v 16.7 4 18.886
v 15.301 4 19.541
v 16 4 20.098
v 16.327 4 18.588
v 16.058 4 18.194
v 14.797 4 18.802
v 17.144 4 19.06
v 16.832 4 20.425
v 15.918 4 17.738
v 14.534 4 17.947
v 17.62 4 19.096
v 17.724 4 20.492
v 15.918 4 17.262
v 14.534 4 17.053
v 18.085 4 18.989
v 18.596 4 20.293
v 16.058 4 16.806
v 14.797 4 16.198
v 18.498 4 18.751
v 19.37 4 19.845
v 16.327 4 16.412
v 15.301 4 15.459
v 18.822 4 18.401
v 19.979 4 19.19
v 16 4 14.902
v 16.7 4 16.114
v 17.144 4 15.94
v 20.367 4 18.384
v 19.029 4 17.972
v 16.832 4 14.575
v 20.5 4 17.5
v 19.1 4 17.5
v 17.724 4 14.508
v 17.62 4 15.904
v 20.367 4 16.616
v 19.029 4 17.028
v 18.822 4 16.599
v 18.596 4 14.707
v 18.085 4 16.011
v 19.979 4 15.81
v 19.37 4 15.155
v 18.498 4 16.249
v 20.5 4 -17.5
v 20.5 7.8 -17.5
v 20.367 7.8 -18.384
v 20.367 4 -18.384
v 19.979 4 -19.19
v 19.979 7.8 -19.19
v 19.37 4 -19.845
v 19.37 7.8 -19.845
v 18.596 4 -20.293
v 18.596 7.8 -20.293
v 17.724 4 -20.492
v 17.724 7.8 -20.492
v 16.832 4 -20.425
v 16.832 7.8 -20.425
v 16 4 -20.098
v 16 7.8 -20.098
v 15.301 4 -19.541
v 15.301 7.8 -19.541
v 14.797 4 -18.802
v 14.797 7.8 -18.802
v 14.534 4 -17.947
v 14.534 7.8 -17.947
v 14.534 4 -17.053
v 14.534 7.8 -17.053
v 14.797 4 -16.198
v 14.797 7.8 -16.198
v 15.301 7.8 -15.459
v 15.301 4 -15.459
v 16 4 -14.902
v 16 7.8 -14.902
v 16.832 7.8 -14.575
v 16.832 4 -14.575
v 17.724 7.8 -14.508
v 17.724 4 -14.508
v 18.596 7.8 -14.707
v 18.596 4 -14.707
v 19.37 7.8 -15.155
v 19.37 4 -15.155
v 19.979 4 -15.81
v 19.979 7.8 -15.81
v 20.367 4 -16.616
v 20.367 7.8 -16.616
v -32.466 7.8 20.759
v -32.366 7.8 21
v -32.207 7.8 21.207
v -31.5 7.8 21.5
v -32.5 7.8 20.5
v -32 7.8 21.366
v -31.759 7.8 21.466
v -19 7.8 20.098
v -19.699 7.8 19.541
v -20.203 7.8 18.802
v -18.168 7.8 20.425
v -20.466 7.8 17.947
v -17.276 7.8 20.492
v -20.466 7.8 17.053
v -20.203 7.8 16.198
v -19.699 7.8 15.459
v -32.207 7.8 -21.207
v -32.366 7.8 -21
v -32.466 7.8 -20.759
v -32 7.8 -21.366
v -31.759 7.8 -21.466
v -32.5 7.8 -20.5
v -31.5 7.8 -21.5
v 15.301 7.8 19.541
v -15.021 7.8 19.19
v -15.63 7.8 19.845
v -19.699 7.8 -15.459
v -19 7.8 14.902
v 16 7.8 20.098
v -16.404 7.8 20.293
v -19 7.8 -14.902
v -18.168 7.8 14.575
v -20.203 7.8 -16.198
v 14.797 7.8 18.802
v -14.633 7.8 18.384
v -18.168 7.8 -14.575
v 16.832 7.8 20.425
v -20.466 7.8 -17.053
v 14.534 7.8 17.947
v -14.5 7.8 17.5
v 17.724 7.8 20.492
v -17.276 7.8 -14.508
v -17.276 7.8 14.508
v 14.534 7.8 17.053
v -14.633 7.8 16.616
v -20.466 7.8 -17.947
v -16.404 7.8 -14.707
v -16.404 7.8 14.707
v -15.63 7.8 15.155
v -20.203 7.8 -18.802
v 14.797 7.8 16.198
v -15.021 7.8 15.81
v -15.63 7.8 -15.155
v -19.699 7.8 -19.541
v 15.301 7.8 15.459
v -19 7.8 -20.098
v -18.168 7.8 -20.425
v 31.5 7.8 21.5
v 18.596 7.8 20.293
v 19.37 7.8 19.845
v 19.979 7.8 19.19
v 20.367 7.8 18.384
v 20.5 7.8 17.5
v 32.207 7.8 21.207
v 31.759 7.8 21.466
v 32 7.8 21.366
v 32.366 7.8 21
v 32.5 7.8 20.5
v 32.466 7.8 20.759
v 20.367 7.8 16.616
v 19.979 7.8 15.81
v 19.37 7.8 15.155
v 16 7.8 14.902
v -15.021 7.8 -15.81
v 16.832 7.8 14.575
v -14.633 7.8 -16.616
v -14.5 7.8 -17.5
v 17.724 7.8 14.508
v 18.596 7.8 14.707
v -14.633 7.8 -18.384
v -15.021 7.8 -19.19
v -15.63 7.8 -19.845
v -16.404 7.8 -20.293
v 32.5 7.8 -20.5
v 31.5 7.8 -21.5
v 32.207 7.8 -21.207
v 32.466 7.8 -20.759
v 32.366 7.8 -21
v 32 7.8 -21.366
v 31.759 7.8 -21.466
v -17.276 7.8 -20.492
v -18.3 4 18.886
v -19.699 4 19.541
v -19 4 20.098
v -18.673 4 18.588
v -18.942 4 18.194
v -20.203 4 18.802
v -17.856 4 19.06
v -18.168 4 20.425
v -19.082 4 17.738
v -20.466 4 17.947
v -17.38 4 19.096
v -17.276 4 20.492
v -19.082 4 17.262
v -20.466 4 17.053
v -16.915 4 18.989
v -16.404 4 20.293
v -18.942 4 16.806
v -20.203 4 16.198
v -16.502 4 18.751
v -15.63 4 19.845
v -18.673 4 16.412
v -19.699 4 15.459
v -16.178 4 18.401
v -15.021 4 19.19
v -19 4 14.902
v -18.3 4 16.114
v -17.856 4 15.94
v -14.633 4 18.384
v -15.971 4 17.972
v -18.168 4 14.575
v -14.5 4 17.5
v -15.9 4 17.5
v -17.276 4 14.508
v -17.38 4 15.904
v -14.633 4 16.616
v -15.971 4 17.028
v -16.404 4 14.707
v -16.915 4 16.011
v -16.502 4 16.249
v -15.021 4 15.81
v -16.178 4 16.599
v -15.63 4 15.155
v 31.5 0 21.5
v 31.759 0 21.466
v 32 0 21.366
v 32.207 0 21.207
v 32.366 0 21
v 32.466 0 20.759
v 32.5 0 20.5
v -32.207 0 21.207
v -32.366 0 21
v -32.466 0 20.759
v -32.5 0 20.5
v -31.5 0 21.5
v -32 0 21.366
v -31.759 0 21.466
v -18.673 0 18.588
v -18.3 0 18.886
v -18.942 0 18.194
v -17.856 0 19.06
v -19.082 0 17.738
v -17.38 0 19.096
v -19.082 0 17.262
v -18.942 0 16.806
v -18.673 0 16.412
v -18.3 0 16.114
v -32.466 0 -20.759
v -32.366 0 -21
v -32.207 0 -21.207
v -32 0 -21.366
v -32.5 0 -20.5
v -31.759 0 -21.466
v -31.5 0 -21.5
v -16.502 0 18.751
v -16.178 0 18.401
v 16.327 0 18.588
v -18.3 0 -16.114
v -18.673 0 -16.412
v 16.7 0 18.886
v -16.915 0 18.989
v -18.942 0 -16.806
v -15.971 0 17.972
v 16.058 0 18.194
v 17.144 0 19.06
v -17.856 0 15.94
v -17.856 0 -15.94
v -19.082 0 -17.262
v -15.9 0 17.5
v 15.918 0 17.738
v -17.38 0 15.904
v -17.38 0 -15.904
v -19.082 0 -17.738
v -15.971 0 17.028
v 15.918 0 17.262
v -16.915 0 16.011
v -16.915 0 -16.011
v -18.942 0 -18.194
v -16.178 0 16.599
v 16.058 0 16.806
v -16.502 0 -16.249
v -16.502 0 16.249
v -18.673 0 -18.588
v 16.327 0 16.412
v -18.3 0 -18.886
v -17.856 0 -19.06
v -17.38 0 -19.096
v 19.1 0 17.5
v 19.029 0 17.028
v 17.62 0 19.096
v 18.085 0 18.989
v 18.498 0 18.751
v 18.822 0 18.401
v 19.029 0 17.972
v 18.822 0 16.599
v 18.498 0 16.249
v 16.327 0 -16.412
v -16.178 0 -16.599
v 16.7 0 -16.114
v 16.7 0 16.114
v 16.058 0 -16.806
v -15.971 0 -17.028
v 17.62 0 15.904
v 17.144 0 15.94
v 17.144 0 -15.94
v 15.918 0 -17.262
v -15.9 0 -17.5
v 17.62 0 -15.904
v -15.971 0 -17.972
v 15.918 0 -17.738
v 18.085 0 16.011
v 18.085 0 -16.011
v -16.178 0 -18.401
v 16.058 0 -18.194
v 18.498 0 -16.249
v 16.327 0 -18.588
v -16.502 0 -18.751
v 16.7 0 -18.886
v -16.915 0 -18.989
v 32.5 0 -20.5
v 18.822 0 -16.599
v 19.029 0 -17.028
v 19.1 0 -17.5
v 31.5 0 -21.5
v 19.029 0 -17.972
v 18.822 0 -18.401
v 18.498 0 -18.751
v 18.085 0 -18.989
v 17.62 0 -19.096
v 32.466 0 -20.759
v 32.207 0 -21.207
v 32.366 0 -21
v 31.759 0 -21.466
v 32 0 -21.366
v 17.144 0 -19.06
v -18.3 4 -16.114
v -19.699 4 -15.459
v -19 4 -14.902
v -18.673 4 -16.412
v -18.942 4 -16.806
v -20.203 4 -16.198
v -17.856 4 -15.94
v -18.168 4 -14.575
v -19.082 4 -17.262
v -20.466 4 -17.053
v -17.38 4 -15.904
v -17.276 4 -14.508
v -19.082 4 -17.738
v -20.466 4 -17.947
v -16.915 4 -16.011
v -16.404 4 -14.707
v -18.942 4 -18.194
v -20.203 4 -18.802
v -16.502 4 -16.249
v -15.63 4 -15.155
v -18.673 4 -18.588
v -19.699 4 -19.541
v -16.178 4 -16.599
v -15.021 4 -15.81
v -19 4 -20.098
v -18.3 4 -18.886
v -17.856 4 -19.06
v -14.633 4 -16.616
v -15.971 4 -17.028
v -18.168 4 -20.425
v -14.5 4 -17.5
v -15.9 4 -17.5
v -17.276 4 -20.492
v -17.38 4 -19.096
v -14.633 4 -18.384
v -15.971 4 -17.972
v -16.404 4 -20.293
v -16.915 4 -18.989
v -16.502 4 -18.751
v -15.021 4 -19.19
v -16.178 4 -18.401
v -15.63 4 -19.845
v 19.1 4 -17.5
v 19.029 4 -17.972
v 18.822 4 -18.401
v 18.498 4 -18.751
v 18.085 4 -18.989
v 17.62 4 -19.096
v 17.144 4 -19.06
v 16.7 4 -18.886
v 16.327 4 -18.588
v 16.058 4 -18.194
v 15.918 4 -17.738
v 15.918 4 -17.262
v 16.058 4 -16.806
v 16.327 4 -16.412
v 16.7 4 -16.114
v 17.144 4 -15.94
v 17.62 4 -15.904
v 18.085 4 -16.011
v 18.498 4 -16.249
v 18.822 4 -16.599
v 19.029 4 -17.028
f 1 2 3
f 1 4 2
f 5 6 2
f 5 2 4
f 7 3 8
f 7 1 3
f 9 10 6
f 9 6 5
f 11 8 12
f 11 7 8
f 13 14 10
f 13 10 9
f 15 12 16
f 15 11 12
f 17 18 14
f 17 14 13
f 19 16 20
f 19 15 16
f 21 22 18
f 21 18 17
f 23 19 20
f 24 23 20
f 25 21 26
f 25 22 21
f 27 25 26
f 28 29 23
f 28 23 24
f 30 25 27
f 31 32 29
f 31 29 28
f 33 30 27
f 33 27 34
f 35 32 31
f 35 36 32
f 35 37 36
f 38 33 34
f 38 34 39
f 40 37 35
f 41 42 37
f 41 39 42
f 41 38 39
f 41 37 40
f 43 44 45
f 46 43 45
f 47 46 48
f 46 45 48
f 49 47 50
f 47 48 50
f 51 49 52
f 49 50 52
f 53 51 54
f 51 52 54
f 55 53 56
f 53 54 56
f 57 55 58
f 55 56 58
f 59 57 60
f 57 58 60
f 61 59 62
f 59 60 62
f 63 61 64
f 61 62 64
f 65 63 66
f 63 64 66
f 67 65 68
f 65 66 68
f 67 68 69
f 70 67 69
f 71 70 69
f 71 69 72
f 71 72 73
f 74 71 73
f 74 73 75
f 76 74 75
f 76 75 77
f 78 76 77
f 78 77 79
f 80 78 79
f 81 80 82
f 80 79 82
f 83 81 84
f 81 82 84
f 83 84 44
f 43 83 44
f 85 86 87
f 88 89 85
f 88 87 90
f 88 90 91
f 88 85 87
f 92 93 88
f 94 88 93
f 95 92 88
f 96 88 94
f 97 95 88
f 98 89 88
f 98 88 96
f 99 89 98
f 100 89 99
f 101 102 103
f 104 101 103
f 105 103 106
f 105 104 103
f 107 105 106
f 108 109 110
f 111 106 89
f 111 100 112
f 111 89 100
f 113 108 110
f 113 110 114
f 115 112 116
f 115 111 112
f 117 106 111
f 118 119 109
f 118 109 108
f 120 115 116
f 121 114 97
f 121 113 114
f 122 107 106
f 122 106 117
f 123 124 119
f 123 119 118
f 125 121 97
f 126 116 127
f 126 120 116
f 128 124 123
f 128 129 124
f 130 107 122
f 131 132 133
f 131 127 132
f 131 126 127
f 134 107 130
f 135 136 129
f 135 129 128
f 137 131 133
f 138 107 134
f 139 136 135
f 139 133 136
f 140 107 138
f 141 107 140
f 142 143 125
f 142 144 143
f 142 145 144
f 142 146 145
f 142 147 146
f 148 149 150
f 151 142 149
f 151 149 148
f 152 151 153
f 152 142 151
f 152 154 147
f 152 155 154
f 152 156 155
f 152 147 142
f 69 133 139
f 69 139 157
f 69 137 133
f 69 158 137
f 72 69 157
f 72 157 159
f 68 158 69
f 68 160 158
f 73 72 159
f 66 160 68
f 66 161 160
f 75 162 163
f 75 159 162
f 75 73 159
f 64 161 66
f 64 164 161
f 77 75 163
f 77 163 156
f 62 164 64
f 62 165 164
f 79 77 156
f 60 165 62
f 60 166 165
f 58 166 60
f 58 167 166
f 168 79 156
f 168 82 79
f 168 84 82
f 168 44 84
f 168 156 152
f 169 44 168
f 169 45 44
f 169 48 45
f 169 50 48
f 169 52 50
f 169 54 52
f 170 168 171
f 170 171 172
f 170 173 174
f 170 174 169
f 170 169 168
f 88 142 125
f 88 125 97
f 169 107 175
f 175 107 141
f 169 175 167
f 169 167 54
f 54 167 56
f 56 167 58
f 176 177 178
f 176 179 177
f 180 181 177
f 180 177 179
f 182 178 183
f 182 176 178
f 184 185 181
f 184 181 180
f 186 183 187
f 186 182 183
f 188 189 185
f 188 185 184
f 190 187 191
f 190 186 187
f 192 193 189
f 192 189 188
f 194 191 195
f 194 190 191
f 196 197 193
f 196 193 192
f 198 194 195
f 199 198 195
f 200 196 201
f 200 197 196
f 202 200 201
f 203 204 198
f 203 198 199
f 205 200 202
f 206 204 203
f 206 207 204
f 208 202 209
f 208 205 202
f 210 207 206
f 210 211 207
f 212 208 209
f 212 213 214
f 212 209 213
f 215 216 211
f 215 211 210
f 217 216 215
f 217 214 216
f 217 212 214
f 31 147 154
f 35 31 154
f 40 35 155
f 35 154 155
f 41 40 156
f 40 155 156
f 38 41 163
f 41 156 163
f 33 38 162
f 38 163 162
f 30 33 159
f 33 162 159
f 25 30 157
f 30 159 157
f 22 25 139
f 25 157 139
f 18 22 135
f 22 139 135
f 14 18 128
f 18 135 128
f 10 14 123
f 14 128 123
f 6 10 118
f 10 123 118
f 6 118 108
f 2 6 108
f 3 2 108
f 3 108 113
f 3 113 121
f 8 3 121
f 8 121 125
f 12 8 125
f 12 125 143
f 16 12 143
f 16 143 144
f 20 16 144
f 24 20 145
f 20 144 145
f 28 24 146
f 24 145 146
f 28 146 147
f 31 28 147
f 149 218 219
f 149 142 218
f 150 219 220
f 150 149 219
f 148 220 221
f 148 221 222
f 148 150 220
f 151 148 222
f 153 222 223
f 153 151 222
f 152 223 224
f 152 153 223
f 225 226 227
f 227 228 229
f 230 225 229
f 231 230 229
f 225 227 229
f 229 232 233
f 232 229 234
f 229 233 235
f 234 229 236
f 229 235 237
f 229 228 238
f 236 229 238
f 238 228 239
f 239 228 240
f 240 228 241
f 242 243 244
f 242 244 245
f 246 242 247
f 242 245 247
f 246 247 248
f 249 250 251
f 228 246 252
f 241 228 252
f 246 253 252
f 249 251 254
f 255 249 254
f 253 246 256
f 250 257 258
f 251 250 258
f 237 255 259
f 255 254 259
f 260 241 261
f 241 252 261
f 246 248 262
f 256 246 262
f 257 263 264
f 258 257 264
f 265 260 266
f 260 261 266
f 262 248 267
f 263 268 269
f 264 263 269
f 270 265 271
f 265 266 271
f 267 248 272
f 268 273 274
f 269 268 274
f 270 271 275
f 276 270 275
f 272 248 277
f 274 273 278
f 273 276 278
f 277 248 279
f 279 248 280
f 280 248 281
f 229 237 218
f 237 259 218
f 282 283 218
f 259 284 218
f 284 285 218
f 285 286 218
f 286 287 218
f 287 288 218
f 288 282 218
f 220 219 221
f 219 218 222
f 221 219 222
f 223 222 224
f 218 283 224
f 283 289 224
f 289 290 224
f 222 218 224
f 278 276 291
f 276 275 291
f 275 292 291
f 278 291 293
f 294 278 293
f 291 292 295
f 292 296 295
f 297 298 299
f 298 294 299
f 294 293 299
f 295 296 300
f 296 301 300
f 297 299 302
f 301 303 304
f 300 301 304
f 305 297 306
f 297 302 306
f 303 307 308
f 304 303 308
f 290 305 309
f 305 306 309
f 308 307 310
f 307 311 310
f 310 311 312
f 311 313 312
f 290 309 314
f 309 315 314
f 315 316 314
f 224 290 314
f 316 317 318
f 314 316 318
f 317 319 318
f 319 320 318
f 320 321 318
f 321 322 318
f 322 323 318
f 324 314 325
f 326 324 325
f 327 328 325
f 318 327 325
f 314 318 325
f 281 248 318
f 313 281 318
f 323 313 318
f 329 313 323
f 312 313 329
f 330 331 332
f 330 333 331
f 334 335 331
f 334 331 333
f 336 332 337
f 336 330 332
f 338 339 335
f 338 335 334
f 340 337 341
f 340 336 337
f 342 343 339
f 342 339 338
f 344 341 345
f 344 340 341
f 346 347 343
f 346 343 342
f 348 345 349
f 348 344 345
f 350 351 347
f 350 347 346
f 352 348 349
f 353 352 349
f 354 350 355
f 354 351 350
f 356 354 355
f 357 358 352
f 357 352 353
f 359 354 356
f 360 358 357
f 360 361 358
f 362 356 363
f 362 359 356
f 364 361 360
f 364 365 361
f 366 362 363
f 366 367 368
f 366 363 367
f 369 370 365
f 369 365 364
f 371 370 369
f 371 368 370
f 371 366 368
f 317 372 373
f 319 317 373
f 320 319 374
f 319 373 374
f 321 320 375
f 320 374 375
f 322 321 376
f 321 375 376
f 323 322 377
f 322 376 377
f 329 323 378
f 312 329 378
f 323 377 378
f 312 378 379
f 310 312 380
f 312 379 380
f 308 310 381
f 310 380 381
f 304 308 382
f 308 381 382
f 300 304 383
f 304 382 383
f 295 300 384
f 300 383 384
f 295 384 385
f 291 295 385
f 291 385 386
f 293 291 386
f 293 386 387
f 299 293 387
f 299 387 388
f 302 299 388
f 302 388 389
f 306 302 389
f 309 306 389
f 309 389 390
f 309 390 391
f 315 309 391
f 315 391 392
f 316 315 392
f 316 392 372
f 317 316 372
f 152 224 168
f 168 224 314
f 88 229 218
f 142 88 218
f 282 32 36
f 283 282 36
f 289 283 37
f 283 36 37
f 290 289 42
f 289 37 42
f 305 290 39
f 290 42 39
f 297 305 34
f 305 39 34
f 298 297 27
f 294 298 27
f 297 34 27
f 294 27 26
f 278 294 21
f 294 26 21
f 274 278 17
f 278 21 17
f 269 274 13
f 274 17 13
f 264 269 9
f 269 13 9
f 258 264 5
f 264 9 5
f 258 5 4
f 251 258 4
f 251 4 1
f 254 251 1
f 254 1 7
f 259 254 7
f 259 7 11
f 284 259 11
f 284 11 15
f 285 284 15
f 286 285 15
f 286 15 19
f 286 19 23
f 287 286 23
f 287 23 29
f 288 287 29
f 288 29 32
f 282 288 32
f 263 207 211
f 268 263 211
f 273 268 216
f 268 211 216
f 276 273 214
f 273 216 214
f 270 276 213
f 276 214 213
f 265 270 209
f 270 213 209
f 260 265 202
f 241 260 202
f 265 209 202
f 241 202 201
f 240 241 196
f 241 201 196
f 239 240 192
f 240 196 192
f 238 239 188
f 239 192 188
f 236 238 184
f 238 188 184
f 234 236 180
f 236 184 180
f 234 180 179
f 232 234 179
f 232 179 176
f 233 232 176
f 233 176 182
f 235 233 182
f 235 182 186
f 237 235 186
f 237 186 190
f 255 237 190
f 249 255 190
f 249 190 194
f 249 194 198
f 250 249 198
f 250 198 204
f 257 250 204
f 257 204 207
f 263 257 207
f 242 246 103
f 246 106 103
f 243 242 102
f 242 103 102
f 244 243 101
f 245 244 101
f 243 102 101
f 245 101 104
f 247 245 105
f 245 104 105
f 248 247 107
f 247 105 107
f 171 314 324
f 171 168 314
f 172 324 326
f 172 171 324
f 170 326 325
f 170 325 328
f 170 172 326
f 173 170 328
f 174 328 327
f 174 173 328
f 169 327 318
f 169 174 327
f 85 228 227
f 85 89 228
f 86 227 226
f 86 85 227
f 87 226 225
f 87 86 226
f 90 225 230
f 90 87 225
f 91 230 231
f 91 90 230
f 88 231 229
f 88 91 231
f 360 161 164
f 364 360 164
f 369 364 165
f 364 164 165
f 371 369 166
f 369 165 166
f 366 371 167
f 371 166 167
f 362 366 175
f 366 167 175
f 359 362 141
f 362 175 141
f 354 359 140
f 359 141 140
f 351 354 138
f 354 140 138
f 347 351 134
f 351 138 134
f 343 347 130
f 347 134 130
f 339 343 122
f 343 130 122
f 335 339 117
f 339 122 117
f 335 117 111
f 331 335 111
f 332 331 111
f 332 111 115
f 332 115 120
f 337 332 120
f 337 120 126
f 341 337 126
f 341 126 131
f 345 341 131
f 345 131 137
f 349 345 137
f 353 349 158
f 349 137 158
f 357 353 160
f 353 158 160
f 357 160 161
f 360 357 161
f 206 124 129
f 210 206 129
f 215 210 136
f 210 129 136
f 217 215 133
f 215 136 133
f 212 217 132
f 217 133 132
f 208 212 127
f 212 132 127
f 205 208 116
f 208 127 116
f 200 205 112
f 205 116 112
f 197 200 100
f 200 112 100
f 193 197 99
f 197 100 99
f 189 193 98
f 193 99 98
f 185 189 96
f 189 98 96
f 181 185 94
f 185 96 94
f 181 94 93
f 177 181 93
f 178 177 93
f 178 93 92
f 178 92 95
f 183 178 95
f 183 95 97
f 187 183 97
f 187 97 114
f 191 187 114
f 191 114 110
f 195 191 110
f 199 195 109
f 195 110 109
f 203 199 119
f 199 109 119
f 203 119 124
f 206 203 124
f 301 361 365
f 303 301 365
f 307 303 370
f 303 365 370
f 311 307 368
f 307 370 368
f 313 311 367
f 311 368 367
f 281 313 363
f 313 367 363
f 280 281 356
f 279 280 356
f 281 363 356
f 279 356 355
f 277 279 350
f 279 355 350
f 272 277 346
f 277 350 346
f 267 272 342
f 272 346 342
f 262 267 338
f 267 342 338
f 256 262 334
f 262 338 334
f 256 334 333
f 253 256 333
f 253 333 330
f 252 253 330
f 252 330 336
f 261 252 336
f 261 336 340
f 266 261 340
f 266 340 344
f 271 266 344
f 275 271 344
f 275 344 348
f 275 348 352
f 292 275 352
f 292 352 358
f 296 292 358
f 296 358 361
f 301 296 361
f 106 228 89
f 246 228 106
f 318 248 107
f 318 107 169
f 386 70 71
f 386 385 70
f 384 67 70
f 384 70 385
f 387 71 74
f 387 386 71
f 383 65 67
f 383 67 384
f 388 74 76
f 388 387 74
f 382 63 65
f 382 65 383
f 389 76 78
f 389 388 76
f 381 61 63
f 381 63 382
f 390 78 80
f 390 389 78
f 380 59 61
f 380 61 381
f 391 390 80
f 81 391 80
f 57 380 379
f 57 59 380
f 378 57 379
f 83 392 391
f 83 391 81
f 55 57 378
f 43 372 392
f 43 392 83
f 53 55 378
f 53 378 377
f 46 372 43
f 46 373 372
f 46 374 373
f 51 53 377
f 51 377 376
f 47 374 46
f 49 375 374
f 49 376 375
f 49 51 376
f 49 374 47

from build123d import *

# Parameters (mm, degrees)
SKETCH2_W           = 65
SKETCH2_H           = 43
BOSS_EXTRUDE1_DEPTH = 7.8
FILLET1_R           = 1
CUT_EXTRUDE1_REACH  = 9.8
SKETCH3_R           = 1.6
SKETCH4_R           = 3
CUT_EXTRUDE2_DEPTH  = 3.8


with BuildPart() as part:
    # Sketch2 → Boss-Extrude1 (new body)
    with BuildSketch(Plane(origin=(0, 0, 0), x_dir=(1, 0, 0), z_dir=(0, 1, 0))):
        Rectangle(SKETCH2_W, SKETCH2_H)
    extrude(amount=BOSS_EXTRUDE1_DEPTH)

    # Fillet1
    fillet1_edges = [part.edges().sort_by_distance(p)[0] for p in [
        (-32.5, 3.9, -21.5),
        (32.5, 3.9, -21.5),
        (32.5, 3.9, 21.5),
        (-32.5, 3.9, 21.5),
    ]]
    fillet(fillet1_edges, radius=FILLET1_R)

    # Sketch3 → Cut-Extrude1 (cut, up to next)
    with BuildSketch(Plane(origin=(0, 7.8, 0), x_dir=(1, 0, 0), z_dir=(0, 1, 0)), mode=Mode.PRIVATE) as cut_extrude1_sk1:
        with Locations((-17.5, 17.5)):
            Circle(SKETCH3_R)
    cut_extrude1_tool1 = extrude(cut_extrude1_sk1.sketch, amount=-CUT_EXTRUDE1_REACH, mode=Mode.PRIVATE) & part.part
    add(cut_extrude1_tool1.solids().sort_by_distance((-17.5, 7.8, -17.5))[0], mode=Mode.SUBTRACT)
    # Sketch3 → Cut-Extrude1 (cut, up to next)
    with BuildSketch(Plane(origin=(0, 7.8, 0), x_dir=(1, 0, 0), z_dir=(0, 1, 0)), mode=Mode.PRIVATE) as cut_extrude1_sk2:
        with Locations((17.5, 17.5)):
            Circle(SKETCH3_R)
    cut_extrude1_tool2 = extrude(cut_extrude1_sk2.sketch, amount=-CUT_EXTRUDE1_REACH, mode=Mode.PRIVATE) & part.part
    add(cut_extrude1_tool2.solids().sort_by_distance((17.5, 7.8, -17.5))[0], mode=Mode.SUBTRACT)
    # Sketch3 → Cut-Extrude1 (cut, up to next)
    with BuildSketch(Plane(origin=(0, 7.8, 0), x_dir=(1, 0, 0), z_dir=(0, 1, 0)), mode=Mode.PRIVATE) as cut_extrude1_sk3:
        with Locations((17.5, -17.5)):
            Circle(SKETCH3_R)
    cut_extrude1_tool3 = extrude(cut_extrude1_sk3.sketch, amount=-CUT_EXTRUDE1_REACH, mode=Mode.PRIVATE) & part.part
    add(cut_extrude1_tool3.solids().sort_by_distance((17.5, 7.8, 17.5))[0], mode=Mode.SUBTRACT)
    # Sketch3 → Cut-Extrude1 (cut, up to next)
    with BuildSketch(Plane(origin=(0, 7.8, 0), x_dir=(1, 0, 0), z_dir=(0, 1, 0)), mode=Mode.PRIVATE) as cut_extrude1_sk4:
        with Locations((-17.5, -17.5)):
            Circle(SKETCH3_R)
    cut_extrude1_tool4 = extrude(cut_extrude1_sk4.sketch, amount=-CUT_EXTRUDE1_REACH, mode=Mode.PRIVATE) & part.part
    add(cut_extrude1_tool4.solids().sort_by_distance((-17.5, 7.8, 17.5))[0], mode=Mode.SUBTRACT)

    # Sketch4 → Cut-Extrude2 (cut)
    with BuildSketch(Plane(origin=(0, 7.8, 0), x_dir=(1, 0, 0), z_dir=(0, 1, 0))):
        with Locations((-17.5, 17.5)):
            Circle(SKETCH4_R)
        with Locations((17.5, 17.5)):
            Circle(SKETCH4_R)
        with Locations((17.5, -17.5)):
            Circle(SKETCH4_R)
        with Locations((-17.5, -17.5)):
            Circle(SKETCH4_R)
    extrude(amount=-CUT_EXTRUDE2_DEPTH, mode=Mode.SUBTRACT)


solid = part.part
